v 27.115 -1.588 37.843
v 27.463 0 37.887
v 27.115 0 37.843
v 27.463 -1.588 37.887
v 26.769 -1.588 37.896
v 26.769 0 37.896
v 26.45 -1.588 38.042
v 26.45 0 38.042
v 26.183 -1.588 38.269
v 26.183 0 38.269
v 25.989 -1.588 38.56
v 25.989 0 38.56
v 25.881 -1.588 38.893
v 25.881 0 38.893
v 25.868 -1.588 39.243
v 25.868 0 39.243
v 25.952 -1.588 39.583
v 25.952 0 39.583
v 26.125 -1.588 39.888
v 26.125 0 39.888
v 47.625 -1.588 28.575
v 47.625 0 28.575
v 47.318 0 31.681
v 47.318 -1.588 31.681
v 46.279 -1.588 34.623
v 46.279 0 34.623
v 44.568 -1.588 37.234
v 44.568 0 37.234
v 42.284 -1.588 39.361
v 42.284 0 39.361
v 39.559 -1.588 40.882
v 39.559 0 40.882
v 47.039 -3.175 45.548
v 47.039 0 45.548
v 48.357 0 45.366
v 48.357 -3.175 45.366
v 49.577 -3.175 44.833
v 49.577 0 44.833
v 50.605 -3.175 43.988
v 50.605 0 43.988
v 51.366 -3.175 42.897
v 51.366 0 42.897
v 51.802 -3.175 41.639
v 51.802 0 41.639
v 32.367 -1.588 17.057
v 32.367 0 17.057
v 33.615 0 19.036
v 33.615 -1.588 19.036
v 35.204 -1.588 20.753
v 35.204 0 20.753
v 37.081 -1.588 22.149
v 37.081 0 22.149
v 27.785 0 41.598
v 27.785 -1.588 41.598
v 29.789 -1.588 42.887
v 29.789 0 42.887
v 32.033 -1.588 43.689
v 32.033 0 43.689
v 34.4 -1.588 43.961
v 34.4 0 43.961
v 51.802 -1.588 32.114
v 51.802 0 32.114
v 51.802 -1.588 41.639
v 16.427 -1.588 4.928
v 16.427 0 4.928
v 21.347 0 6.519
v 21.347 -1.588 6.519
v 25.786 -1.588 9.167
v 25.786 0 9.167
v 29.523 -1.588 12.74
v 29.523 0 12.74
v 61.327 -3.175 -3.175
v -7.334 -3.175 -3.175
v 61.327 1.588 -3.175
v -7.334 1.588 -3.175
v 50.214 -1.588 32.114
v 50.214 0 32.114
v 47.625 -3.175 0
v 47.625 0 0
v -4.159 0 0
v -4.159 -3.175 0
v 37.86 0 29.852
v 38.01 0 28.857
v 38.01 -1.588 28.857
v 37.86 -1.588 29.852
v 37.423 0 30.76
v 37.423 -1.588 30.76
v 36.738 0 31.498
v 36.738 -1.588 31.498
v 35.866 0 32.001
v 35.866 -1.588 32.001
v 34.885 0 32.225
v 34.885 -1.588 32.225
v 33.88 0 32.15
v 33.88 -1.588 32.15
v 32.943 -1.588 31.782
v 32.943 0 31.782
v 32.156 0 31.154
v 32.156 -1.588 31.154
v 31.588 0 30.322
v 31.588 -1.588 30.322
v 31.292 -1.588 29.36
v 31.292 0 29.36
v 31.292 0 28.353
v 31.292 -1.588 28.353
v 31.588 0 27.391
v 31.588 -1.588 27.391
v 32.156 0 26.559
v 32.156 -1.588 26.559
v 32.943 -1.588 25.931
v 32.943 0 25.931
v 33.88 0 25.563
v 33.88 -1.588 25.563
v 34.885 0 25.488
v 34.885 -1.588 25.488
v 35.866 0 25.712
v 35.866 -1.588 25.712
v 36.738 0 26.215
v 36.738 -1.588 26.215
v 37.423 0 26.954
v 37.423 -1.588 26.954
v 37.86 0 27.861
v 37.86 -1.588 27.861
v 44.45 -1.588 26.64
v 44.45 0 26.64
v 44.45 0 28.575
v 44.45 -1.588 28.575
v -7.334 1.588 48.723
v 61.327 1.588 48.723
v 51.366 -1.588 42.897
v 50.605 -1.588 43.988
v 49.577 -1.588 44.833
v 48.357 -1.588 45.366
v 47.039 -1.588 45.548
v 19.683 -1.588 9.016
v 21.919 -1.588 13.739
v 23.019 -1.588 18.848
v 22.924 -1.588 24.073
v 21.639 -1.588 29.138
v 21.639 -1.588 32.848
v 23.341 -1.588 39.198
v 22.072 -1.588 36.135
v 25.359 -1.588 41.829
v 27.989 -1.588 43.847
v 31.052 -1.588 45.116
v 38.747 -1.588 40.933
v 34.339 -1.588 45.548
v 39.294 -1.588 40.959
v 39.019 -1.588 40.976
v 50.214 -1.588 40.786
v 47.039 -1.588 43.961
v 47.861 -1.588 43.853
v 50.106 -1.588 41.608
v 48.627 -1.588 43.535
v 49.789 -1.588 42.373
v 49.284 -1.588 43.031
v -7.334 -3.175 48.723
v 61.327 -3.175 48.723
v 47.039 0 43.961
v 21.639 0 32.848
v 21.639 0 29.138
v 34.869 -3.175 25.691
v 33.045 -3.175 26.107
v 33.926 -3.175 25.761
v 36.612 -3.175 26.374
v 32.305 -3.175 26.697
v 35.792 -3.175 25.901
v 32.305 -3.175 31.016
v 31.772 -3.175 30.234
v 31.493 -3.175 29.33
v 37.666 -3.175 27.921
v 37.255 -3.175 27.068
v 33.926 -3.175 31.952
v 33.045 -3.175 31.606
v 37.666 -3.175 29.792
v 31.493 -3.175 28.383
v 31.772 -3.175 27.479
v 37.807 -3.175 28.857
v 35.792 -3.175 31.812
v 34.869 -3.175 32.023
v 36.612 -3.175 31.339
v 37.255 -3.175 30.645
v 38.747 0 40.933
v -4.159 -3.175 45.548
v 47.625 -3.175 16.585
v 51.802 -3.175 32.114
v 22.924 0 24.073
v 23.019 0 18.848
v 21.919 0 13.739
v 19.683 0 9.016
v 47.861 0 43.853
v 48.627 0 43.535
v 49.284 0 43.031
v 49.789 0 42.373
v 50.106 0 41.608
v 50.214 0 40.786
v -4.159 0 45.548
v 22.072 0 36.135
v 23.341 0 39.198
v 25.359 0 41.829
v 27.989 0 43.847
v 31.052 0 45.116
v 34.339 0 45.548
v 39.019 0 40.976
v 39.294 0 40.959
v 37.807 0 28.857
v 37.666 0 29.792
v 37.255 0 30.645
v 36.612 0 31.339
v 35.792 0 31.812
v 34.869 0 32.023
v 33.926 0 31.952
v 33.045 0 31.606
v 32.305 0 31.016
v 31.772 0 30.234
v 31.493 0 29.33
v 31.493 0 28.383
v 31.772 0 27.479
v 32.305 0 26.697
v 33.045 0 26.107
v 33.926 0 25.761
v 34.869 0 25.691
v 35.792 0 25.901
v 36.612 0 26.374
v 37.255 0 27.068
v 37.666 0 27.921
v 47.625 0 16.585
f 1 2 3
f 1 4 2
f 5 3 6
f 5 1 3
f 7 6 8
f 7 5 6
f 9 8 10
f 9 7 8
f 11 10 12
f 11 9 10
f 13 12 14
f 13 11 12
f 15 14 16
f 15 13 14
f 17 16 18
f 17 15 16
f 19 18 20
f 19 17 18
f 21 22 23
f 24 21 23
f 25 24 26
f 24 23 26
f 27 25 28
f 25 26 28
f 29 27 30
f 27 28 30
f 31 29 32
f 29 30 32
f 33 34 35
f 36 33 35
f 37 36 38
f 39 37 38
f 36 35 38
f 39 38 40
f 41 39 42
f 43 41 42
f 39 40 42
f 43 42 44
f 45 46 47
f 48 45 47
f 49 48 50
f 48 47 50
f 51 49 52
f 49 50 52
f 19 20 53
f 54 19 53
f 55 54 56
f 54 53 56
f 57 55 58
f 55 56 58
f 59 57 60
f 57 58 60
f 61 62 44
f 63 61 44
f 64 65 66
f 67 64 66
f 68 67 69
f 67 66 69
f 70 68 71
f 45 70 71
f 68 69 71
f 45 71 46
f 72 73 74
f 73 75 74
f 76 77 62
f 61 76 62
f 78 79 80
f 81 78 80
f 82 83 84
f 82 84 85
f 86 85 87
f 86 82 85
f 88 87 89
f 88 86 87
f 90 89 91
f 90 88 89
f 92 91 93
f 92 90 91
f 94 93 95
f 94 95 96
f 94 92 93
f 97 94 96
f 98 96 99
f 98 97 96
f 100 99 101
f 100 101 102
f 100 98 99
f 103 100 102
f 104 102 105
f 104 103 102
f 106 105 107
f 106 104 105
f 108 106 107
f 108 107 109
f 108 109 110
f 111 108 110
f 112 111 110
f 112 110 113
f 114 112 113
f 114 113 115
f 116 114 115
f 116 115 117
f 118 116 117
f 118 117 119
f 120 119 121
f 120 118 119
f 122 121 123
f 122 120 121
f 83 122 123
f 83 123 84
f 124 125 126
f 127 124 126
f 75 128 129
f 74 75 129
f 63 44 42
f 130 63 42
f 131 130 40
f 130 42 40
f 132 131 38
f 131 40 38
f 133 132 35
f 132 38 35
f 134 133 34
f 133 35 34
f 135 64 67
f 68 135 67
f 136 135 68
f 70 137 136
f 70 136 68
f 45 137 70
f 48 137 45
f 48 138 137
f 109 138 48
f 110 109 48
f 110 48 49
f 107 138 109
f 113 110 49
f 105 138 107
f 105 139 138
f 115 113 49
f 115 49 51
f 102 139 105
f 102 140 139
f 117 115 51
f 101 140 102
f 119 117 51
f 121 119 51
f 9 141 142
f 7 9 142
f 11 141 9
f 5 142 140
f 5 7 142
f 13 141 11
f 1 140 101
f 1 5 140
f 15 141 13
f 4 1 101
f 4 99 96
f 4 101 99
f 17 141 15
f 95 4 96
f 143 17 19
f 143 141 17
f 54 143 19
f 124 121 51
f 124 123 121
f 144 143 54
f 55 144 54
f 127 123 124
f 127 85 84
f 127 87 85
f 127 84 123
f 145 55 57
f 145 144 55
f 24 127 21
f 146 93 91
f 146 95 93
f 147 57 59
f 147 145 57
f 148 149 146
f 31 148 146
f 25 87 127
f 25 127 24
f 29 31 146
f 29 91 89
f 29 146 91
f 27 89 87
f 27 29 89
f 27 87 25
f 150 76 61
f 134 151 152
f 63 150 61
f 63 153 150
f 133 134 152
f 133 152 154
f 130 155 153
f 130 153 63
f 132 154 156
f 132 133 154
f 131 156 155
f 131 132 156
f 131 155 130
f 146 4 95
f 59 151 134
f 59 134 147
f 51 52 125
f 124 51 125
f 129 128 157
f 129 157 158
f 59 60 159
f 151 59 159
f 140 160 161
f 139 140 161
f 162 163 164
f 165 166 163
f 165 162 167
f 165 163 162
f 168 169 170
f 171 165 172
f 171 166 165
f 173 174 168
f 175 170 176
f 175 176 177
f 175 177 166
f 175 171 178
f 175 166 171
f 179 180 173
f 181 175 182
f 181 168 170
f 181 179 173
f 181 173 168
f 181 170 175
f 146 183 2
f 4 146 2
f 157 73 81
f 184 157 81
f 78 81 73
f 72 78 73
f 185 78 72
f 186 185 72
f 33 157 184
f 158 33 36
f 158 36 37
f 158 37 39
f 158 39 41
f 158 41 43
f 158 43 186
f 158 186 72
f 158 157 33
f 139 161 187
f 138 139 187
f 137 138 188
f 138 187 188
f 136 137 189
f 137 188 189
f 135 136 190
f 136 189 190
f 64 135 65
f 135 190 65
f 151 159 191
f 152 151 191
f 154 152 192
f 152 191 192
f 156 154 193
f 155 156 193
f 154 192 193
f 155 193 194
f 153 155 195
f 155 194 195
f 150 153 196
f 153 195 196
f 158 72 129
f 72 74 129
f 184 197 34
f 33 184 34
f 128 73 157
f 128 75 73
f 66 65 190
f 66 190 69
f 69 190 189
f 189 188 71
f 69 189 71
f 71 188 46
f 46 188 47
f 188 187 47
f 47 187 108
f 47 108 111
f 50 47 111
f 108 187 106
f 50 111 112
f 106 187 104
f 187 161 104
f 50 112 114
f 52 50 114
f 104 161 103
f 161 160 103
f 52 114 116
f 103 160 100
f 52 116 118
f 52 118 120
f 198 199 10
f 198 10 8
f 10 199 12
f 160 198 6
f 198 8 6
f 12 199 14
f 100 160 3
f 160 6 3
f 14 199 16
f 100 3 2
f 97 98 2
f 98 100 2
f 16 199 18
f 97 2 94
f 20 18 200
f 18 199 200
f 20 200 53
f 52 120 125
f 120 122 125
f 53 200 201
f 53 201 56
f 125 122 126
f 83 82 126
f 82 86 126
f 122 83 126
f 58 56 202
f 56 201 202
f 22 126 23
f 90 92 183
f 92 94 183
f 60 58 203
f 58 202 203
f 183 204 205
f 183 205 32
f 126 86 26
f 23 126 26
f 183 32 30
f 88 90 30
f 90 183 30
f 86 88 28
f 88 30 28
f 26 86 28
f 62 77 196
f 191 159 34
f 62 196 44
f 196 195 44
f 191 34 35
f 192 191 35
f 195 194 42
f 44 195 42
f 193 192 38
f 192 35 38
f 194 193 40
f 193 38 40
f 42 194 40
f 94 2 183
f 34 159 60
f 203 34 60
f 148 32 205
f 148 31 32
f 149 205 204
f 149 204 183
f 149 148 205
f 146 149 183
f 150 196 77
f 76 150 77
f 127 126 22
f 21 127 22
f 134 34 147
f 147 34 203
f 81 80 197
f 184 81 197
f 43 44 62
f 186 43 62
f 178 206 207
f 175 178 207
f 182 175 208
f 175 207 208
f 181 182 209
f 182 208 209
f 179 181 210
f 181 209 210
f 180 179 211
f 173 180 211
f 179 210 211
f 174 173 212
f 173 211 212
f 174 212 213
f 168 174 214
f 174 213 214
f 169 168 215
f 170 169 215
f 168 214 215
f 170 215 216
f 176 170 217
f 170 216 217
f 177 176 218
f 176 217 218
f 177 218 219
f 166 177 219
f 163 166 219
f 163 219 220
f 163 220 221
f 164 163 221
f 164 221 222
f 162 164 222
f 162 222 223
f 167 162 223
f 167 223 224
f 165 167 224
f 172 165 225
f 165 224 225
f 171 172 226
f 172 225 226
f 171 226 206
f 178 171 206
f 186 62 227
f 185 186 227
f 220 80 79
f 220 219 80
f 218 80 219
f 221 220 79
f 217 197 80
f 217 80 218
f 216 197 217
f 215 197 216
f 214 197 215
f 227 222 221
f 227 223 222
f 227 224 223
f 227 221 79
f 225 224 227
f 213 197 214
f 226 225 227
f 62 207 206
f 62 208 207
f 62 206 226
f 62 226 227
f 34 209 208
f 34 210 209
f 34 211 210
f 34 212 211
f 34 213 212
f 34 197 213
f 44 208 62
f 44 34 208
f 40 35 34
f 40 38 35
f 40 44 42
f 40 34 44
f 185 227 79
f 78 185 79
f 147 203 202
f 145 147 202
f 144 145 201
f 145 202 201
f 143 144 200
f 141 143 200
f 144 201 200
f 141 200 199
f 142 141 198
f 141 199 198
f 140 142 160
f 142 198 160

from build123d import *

# Parameters (mm, degrees)
F0_R     = 3.3782
F1_DEPTH = 1.5875
F2_R     = 1.27
F0_W     = 68.6608534306
F0_H     = 51.8983377281
F0_R_2   = 3.175
F3_DEPTH = 1.5875
F4_DEPTH = 3.175


with BuildPart() as f1:
    # F0 (on Front) → F1 (new body)
    with BuildSketch(Plane.XZ):
        with BuildLine():
            Line((37.0810907311, 22.1493569333), (44.45, 26.6400993653))
            Line((44.45, 26.6400993653), (44.45, 28.575))
            Line((44.45, 28.575), (47.625, 28.575))
            ThreePointArc((47.625, 28.575), (45.3798217244, 36.1628892804), (39.1499755584, 41.0420189125))
            Line((39.1499755584, 41.0420189125), (24.5960312701, 37.1132397757))
            ThreePointArc((24.5960312701, 37.1132397757), (28.4208043201, 42.0794558253), (34.4001515145, 43.9608377281))
            Line((34.4001515145, 43.9608377281), (47.0392336093, 43.9608377281))
            Line((47.0392336093, 43.9608377281), (47.0392336093, 45.5483377281))
            Line((47.0392336093, 45.5483377281), (34.3392336093, 45.5483377281))
            ThreePointArc((34.3392336093, 45.5483377281), (25.3589774882, 41.8285938491), (21.6392336093, 32.8483377281))
            Line((21.6392336093, 32.8483377281), (21.6392336093, 29.1382938078))
            ThreePointArc((21.6392336093, 29.1382938078), (22.6164587492, 16.2619847329), (16.4273683424, 4.9284299373))
            ThreePointArc((16.4273683424, 4.9284299373), (25.7864104877, 9.1668684971), (32.3673924103, 17.0565268063))
            ThreePointArc((32.3673924103, 17.0565268063), (34.369647916, 19.9311380738), (37.0810907311, 22.1493569333))
        make_face()
        with Locations((34.6321168046, 28.8566469039)):
            Circle(F0_R, mode=Mode.SUBTRACT)
        with BuildLine():
            Line((50.2142336093, 32.1144140998), (51.8017336093, 32.1144140998))
            Line((51.8017336093, 32.1144140998), (51.8017336093, 41.6394140998))
            ThreePointArc((51.8017336093, 41.6394140998), (50.1198622051, 44.4459750797), (47.0392336093, 45.5483377281))
            Line((47.0392336093, 45.5483377281), (47.0392336093, 43.9608377281))
            ThreePointArc((47.0392336093, 43.9608377281), (49.2842976395, 43.0309017583), (50.2142336093, 40.7858377281))
            Line((50.2142336093, 40.7858377281), (50.2142336093, 32.1144140998))
        make_face()
    extrude(amount=F1_DEPTH)

    # F2
    f2_edges = [f1.edges().sort_by_distance(p)[0] for p in [
        (24.596031, -0.79375, 37.11324),
        (39.149976, -0.79375, 41.042019),
    ]]
    fillet(f2_edges, radius=F2_R)


with BuildPart() as f3:
    # F0 (on Front) → F3 (new body)
    with BuildSketch(Plane.XZ):
        with Locations((26.9963068939, 22.774168864)):
            Rectangle(F0_W, F0_H)
        Polygon((47.625, 0), (0, 0), (-4.1591198214, 0), (-4.1591198214, 45.5483377281), (34.3392336093, 45.5483377281), (47.0392336093, 45.5483377281), (58.1517336093, 45.5483377281), (58.1517336093, 0), align=None, mode=Mode.SUBTRACT)
        with BuildLine():
            Line((-4.1591198214, 0), (0, 0))
            Line((0, 0), (47.625, 0))
            Line((47.625, 0), (47.625, 16.5848955512))
            Line((47.625, 16.5848955512), (44.45, 26.6400993653))
            Line((44.45, 26.6400993653), (37.0810907311, 22.1493569333))
            ThreePointArc((37.0810907311, 22.1493569333), (34.369647916, 19.9311380738), (32.3673924103, 17.0565268063))
            ThreePointArc((32.3673924103, 17.0565268063), (25.7864104877, 9.1668684971), (16.4273683424, 4.9284299373))
            ThreePointArc((16.4273683424, 4.9284299373), (22.6164587492, 16.2619847329), (21.6392336093, 29.1382938078))
            Line((21.6392336093, 29.1382938078), (21.6392336093, 32.8483377281))
            ThreePointArc((21.6392336093, 32.8483377281), (25.3589774882, 41.8285938491), (34.3392336093, 45.5483377281))
            Line((34.3392336093, 45.5483377281), (-4.1591198214, 45.5483377281))
            Line((-4.1591198214, 45.5483377281), (-4.1591198214, 0))
        make_face()
        with BuildLine():
            Line((37.0810907311, 22.1493569333), (44.45, 26.6400993653))
            Line((44.45, 26.6400993653), (44.45, 28.575))
            Line((44.45, 28.575), (47.625, 28.575))
            ThreePointArc((47.625, 28.575), (45.3798217244, 36.1628892804), (39.1499755584, 41.0420189125))
            Line((39.1499755584, 41.0420189125), (24.5960312701, 37.1132397757))
            ThreePointArc((24.5960312701, 37.1132397757), (28.4208043201, 42.0794558253), (34.4001515145, 43.9608377281))
            Line((34.4001515145, 43.9608377281), (47.0392336093, 43.9608377281))
            Line((47.0392336093, 43.9608377281), (47.0392336093, 45.5483377281))
            Line((47.0392336093, 45.5483377281), (34.3392336093, 45.5483377281))
            ThreePointArc((34.3392336093, 45.5483377281), (25.3589774882, 41.8285938491), (21.6392336093, 32.8483377281))
            Line((21.6392336093, 32.8483377281), (21.6392336093, 29.1382938078))
            ThreePointArc((21.6392336093, 29.1382938078), (22.6164587492, 16.2619847329), (16.4273683424, 4.9284299373))
            ThreePointArc((16.4273683424, 4.9284299373), (25.7864104877, 9.1668684971), (32.3673924103, 17.0565268063))
            ThreePointArc((32.3673924103, 17.0565268063), (34.369647916, 19.9311380738), (37.0810907311, 22.1493569333))
        make_face()
        with Locations((34.6321168046, 28.8566469039)):
            Circle(F0_R, mode=Mode.SUBTRACT)
        with BuildLine():
            Line((47.625, 16.5848955512), (47.625, 0))
            Line((47.625, 0), (58.1517336093, 0))
            Line((58.1517336093, 0), (58.1517336093, 45.5483377281))
            Line((58.1517336093, 45.5483377281), (47.0392336093, 45.5483377281))
            ThreePointArc((47.0392336093, 45.5483377281), (50.1198622051, 44.4459750797), (51.8017336093, 41.6394140998))
            Line((51.8017336093, 41.6394140998), (51.8017336093, 32.1144140998))
            Line((51.8017336093, 32.1144140998), (47.625, 16.5848955512))
        make_face()
        with BuildLine():
            Line((44.45, 26.6400993653), (47.625, 16.5848955512))
            Line((47.625, 16.5848955512), (51.8017336093, 32.1144140998))
            Line((51.8017336093, 32.1144140998), (50.2142336093, 32.1144140998))
            Line((50.2142336093, 32.1144140998), (50.2142336093, 40.7858377281))
            ThreePointArc((50.2142336093, 40.7858377281), (49.2842976395, 43.0309017583), (47.0392336093, 43.9608377281))
            Line((47.0392336093, 43.9608377281), (34.4001515145, 43.9608377281))
            ThreePointArc((34.4001515145, 43.9608377281), (28.4208043201, 42.0794558253), (24.5960312701, 37.1132397757))
            Line((24.5960312701, 37.1132397757), (39.1499755584, 41.0420189125))
            ThreePointArc((39.1499755584, 41.0420189125), (45.3798217244, 36.1628892804), (47.625, 28.575))
            Line((47.625, 28.575), (44.45, 28.575))
            Line((44.45, 28.575), (44.45, 26.6400993653))
        make_face()
        with Locations((34.6321168046, 28.8566469039)):
            Circle(F0_R)
        with Locations((34.6321168046, 28.8566469039)):
            Circle(F0_R_2, mode=Mode.SUBTRACT)
        with Locations((34.6321168046, 28.8566469039)):
            Circle(F0_R_2)
        with BuildLine():
            Line((50.2142336093, 32.1144140998), (51.8017336093, 32.1144140998))
            Line((51.8017336093, 32.1144140998), (51.8017336093, 41.6394140998))
            ThreePointArc((51.8017336093, 41.6394140998), (50.1198622051, 44.4459750797), (47.0392336093, 45.5483377281))
            Line((47.0392336093, 45.5483377281), (47.0392336093, 43.9608377281))
            ThreePointArc((47.0392336093, 43.9608377281), (49.2842976395, 43.0309017583), (50.2142336093, 40.7858377281))
            Line((50.2142336093, 40.7858377281), (50.2142336093, 32.1144140998))
        make_face()
    extrude(amount=-F3_DEPTH)

    # F0 (on Front) → F4 (join)
    with BuildSketch(Plane.XZ):
        with Locations((26.9963068939, 22.774168864)):
            Rectangle(F0_W, F0_H)
        Polygon((47.625, 0), (0, 0), (-4.1591198214, 0), (-4.1591198214, 45.5483377281), (34.3392336093, 45.5483377281), (47.0392336093, 45.5483377281), (58.1517336093, 45.5483377281), (58.1517336093, 0), align=None, mode=Mode.SUBTRACT)
        with Locations((34.6321168046, 28.8566469039)):
            Circle(F0_R_2)
        with BuildLine():
            Line((47.625, 16.5848955512), (47.625, 0))
            Line((47.625, 0), (58.1517336093, 0))
            Line((58.1517336093, 0), (58.1517336093, 45.5483377281))
            Line((58.1517336093, 45.5483377281), (47.0392336093, 45.5483377281))
            ThreePointArc((47.0392336093, 45.5483377281), (50.1198622051, 44.4459750797), (51.8017336093, 41.6394140998))
            Line((51.8017336093, 41.6394140998), (51.8017336093, 32.1144140998))
            Line((51.8017336093, 32.1144140998), (47.625, 16.5848955512))
        make_face()
    extrude(amount=F4_DEPTH)


solid = Compound([f1.part, f3.part])
